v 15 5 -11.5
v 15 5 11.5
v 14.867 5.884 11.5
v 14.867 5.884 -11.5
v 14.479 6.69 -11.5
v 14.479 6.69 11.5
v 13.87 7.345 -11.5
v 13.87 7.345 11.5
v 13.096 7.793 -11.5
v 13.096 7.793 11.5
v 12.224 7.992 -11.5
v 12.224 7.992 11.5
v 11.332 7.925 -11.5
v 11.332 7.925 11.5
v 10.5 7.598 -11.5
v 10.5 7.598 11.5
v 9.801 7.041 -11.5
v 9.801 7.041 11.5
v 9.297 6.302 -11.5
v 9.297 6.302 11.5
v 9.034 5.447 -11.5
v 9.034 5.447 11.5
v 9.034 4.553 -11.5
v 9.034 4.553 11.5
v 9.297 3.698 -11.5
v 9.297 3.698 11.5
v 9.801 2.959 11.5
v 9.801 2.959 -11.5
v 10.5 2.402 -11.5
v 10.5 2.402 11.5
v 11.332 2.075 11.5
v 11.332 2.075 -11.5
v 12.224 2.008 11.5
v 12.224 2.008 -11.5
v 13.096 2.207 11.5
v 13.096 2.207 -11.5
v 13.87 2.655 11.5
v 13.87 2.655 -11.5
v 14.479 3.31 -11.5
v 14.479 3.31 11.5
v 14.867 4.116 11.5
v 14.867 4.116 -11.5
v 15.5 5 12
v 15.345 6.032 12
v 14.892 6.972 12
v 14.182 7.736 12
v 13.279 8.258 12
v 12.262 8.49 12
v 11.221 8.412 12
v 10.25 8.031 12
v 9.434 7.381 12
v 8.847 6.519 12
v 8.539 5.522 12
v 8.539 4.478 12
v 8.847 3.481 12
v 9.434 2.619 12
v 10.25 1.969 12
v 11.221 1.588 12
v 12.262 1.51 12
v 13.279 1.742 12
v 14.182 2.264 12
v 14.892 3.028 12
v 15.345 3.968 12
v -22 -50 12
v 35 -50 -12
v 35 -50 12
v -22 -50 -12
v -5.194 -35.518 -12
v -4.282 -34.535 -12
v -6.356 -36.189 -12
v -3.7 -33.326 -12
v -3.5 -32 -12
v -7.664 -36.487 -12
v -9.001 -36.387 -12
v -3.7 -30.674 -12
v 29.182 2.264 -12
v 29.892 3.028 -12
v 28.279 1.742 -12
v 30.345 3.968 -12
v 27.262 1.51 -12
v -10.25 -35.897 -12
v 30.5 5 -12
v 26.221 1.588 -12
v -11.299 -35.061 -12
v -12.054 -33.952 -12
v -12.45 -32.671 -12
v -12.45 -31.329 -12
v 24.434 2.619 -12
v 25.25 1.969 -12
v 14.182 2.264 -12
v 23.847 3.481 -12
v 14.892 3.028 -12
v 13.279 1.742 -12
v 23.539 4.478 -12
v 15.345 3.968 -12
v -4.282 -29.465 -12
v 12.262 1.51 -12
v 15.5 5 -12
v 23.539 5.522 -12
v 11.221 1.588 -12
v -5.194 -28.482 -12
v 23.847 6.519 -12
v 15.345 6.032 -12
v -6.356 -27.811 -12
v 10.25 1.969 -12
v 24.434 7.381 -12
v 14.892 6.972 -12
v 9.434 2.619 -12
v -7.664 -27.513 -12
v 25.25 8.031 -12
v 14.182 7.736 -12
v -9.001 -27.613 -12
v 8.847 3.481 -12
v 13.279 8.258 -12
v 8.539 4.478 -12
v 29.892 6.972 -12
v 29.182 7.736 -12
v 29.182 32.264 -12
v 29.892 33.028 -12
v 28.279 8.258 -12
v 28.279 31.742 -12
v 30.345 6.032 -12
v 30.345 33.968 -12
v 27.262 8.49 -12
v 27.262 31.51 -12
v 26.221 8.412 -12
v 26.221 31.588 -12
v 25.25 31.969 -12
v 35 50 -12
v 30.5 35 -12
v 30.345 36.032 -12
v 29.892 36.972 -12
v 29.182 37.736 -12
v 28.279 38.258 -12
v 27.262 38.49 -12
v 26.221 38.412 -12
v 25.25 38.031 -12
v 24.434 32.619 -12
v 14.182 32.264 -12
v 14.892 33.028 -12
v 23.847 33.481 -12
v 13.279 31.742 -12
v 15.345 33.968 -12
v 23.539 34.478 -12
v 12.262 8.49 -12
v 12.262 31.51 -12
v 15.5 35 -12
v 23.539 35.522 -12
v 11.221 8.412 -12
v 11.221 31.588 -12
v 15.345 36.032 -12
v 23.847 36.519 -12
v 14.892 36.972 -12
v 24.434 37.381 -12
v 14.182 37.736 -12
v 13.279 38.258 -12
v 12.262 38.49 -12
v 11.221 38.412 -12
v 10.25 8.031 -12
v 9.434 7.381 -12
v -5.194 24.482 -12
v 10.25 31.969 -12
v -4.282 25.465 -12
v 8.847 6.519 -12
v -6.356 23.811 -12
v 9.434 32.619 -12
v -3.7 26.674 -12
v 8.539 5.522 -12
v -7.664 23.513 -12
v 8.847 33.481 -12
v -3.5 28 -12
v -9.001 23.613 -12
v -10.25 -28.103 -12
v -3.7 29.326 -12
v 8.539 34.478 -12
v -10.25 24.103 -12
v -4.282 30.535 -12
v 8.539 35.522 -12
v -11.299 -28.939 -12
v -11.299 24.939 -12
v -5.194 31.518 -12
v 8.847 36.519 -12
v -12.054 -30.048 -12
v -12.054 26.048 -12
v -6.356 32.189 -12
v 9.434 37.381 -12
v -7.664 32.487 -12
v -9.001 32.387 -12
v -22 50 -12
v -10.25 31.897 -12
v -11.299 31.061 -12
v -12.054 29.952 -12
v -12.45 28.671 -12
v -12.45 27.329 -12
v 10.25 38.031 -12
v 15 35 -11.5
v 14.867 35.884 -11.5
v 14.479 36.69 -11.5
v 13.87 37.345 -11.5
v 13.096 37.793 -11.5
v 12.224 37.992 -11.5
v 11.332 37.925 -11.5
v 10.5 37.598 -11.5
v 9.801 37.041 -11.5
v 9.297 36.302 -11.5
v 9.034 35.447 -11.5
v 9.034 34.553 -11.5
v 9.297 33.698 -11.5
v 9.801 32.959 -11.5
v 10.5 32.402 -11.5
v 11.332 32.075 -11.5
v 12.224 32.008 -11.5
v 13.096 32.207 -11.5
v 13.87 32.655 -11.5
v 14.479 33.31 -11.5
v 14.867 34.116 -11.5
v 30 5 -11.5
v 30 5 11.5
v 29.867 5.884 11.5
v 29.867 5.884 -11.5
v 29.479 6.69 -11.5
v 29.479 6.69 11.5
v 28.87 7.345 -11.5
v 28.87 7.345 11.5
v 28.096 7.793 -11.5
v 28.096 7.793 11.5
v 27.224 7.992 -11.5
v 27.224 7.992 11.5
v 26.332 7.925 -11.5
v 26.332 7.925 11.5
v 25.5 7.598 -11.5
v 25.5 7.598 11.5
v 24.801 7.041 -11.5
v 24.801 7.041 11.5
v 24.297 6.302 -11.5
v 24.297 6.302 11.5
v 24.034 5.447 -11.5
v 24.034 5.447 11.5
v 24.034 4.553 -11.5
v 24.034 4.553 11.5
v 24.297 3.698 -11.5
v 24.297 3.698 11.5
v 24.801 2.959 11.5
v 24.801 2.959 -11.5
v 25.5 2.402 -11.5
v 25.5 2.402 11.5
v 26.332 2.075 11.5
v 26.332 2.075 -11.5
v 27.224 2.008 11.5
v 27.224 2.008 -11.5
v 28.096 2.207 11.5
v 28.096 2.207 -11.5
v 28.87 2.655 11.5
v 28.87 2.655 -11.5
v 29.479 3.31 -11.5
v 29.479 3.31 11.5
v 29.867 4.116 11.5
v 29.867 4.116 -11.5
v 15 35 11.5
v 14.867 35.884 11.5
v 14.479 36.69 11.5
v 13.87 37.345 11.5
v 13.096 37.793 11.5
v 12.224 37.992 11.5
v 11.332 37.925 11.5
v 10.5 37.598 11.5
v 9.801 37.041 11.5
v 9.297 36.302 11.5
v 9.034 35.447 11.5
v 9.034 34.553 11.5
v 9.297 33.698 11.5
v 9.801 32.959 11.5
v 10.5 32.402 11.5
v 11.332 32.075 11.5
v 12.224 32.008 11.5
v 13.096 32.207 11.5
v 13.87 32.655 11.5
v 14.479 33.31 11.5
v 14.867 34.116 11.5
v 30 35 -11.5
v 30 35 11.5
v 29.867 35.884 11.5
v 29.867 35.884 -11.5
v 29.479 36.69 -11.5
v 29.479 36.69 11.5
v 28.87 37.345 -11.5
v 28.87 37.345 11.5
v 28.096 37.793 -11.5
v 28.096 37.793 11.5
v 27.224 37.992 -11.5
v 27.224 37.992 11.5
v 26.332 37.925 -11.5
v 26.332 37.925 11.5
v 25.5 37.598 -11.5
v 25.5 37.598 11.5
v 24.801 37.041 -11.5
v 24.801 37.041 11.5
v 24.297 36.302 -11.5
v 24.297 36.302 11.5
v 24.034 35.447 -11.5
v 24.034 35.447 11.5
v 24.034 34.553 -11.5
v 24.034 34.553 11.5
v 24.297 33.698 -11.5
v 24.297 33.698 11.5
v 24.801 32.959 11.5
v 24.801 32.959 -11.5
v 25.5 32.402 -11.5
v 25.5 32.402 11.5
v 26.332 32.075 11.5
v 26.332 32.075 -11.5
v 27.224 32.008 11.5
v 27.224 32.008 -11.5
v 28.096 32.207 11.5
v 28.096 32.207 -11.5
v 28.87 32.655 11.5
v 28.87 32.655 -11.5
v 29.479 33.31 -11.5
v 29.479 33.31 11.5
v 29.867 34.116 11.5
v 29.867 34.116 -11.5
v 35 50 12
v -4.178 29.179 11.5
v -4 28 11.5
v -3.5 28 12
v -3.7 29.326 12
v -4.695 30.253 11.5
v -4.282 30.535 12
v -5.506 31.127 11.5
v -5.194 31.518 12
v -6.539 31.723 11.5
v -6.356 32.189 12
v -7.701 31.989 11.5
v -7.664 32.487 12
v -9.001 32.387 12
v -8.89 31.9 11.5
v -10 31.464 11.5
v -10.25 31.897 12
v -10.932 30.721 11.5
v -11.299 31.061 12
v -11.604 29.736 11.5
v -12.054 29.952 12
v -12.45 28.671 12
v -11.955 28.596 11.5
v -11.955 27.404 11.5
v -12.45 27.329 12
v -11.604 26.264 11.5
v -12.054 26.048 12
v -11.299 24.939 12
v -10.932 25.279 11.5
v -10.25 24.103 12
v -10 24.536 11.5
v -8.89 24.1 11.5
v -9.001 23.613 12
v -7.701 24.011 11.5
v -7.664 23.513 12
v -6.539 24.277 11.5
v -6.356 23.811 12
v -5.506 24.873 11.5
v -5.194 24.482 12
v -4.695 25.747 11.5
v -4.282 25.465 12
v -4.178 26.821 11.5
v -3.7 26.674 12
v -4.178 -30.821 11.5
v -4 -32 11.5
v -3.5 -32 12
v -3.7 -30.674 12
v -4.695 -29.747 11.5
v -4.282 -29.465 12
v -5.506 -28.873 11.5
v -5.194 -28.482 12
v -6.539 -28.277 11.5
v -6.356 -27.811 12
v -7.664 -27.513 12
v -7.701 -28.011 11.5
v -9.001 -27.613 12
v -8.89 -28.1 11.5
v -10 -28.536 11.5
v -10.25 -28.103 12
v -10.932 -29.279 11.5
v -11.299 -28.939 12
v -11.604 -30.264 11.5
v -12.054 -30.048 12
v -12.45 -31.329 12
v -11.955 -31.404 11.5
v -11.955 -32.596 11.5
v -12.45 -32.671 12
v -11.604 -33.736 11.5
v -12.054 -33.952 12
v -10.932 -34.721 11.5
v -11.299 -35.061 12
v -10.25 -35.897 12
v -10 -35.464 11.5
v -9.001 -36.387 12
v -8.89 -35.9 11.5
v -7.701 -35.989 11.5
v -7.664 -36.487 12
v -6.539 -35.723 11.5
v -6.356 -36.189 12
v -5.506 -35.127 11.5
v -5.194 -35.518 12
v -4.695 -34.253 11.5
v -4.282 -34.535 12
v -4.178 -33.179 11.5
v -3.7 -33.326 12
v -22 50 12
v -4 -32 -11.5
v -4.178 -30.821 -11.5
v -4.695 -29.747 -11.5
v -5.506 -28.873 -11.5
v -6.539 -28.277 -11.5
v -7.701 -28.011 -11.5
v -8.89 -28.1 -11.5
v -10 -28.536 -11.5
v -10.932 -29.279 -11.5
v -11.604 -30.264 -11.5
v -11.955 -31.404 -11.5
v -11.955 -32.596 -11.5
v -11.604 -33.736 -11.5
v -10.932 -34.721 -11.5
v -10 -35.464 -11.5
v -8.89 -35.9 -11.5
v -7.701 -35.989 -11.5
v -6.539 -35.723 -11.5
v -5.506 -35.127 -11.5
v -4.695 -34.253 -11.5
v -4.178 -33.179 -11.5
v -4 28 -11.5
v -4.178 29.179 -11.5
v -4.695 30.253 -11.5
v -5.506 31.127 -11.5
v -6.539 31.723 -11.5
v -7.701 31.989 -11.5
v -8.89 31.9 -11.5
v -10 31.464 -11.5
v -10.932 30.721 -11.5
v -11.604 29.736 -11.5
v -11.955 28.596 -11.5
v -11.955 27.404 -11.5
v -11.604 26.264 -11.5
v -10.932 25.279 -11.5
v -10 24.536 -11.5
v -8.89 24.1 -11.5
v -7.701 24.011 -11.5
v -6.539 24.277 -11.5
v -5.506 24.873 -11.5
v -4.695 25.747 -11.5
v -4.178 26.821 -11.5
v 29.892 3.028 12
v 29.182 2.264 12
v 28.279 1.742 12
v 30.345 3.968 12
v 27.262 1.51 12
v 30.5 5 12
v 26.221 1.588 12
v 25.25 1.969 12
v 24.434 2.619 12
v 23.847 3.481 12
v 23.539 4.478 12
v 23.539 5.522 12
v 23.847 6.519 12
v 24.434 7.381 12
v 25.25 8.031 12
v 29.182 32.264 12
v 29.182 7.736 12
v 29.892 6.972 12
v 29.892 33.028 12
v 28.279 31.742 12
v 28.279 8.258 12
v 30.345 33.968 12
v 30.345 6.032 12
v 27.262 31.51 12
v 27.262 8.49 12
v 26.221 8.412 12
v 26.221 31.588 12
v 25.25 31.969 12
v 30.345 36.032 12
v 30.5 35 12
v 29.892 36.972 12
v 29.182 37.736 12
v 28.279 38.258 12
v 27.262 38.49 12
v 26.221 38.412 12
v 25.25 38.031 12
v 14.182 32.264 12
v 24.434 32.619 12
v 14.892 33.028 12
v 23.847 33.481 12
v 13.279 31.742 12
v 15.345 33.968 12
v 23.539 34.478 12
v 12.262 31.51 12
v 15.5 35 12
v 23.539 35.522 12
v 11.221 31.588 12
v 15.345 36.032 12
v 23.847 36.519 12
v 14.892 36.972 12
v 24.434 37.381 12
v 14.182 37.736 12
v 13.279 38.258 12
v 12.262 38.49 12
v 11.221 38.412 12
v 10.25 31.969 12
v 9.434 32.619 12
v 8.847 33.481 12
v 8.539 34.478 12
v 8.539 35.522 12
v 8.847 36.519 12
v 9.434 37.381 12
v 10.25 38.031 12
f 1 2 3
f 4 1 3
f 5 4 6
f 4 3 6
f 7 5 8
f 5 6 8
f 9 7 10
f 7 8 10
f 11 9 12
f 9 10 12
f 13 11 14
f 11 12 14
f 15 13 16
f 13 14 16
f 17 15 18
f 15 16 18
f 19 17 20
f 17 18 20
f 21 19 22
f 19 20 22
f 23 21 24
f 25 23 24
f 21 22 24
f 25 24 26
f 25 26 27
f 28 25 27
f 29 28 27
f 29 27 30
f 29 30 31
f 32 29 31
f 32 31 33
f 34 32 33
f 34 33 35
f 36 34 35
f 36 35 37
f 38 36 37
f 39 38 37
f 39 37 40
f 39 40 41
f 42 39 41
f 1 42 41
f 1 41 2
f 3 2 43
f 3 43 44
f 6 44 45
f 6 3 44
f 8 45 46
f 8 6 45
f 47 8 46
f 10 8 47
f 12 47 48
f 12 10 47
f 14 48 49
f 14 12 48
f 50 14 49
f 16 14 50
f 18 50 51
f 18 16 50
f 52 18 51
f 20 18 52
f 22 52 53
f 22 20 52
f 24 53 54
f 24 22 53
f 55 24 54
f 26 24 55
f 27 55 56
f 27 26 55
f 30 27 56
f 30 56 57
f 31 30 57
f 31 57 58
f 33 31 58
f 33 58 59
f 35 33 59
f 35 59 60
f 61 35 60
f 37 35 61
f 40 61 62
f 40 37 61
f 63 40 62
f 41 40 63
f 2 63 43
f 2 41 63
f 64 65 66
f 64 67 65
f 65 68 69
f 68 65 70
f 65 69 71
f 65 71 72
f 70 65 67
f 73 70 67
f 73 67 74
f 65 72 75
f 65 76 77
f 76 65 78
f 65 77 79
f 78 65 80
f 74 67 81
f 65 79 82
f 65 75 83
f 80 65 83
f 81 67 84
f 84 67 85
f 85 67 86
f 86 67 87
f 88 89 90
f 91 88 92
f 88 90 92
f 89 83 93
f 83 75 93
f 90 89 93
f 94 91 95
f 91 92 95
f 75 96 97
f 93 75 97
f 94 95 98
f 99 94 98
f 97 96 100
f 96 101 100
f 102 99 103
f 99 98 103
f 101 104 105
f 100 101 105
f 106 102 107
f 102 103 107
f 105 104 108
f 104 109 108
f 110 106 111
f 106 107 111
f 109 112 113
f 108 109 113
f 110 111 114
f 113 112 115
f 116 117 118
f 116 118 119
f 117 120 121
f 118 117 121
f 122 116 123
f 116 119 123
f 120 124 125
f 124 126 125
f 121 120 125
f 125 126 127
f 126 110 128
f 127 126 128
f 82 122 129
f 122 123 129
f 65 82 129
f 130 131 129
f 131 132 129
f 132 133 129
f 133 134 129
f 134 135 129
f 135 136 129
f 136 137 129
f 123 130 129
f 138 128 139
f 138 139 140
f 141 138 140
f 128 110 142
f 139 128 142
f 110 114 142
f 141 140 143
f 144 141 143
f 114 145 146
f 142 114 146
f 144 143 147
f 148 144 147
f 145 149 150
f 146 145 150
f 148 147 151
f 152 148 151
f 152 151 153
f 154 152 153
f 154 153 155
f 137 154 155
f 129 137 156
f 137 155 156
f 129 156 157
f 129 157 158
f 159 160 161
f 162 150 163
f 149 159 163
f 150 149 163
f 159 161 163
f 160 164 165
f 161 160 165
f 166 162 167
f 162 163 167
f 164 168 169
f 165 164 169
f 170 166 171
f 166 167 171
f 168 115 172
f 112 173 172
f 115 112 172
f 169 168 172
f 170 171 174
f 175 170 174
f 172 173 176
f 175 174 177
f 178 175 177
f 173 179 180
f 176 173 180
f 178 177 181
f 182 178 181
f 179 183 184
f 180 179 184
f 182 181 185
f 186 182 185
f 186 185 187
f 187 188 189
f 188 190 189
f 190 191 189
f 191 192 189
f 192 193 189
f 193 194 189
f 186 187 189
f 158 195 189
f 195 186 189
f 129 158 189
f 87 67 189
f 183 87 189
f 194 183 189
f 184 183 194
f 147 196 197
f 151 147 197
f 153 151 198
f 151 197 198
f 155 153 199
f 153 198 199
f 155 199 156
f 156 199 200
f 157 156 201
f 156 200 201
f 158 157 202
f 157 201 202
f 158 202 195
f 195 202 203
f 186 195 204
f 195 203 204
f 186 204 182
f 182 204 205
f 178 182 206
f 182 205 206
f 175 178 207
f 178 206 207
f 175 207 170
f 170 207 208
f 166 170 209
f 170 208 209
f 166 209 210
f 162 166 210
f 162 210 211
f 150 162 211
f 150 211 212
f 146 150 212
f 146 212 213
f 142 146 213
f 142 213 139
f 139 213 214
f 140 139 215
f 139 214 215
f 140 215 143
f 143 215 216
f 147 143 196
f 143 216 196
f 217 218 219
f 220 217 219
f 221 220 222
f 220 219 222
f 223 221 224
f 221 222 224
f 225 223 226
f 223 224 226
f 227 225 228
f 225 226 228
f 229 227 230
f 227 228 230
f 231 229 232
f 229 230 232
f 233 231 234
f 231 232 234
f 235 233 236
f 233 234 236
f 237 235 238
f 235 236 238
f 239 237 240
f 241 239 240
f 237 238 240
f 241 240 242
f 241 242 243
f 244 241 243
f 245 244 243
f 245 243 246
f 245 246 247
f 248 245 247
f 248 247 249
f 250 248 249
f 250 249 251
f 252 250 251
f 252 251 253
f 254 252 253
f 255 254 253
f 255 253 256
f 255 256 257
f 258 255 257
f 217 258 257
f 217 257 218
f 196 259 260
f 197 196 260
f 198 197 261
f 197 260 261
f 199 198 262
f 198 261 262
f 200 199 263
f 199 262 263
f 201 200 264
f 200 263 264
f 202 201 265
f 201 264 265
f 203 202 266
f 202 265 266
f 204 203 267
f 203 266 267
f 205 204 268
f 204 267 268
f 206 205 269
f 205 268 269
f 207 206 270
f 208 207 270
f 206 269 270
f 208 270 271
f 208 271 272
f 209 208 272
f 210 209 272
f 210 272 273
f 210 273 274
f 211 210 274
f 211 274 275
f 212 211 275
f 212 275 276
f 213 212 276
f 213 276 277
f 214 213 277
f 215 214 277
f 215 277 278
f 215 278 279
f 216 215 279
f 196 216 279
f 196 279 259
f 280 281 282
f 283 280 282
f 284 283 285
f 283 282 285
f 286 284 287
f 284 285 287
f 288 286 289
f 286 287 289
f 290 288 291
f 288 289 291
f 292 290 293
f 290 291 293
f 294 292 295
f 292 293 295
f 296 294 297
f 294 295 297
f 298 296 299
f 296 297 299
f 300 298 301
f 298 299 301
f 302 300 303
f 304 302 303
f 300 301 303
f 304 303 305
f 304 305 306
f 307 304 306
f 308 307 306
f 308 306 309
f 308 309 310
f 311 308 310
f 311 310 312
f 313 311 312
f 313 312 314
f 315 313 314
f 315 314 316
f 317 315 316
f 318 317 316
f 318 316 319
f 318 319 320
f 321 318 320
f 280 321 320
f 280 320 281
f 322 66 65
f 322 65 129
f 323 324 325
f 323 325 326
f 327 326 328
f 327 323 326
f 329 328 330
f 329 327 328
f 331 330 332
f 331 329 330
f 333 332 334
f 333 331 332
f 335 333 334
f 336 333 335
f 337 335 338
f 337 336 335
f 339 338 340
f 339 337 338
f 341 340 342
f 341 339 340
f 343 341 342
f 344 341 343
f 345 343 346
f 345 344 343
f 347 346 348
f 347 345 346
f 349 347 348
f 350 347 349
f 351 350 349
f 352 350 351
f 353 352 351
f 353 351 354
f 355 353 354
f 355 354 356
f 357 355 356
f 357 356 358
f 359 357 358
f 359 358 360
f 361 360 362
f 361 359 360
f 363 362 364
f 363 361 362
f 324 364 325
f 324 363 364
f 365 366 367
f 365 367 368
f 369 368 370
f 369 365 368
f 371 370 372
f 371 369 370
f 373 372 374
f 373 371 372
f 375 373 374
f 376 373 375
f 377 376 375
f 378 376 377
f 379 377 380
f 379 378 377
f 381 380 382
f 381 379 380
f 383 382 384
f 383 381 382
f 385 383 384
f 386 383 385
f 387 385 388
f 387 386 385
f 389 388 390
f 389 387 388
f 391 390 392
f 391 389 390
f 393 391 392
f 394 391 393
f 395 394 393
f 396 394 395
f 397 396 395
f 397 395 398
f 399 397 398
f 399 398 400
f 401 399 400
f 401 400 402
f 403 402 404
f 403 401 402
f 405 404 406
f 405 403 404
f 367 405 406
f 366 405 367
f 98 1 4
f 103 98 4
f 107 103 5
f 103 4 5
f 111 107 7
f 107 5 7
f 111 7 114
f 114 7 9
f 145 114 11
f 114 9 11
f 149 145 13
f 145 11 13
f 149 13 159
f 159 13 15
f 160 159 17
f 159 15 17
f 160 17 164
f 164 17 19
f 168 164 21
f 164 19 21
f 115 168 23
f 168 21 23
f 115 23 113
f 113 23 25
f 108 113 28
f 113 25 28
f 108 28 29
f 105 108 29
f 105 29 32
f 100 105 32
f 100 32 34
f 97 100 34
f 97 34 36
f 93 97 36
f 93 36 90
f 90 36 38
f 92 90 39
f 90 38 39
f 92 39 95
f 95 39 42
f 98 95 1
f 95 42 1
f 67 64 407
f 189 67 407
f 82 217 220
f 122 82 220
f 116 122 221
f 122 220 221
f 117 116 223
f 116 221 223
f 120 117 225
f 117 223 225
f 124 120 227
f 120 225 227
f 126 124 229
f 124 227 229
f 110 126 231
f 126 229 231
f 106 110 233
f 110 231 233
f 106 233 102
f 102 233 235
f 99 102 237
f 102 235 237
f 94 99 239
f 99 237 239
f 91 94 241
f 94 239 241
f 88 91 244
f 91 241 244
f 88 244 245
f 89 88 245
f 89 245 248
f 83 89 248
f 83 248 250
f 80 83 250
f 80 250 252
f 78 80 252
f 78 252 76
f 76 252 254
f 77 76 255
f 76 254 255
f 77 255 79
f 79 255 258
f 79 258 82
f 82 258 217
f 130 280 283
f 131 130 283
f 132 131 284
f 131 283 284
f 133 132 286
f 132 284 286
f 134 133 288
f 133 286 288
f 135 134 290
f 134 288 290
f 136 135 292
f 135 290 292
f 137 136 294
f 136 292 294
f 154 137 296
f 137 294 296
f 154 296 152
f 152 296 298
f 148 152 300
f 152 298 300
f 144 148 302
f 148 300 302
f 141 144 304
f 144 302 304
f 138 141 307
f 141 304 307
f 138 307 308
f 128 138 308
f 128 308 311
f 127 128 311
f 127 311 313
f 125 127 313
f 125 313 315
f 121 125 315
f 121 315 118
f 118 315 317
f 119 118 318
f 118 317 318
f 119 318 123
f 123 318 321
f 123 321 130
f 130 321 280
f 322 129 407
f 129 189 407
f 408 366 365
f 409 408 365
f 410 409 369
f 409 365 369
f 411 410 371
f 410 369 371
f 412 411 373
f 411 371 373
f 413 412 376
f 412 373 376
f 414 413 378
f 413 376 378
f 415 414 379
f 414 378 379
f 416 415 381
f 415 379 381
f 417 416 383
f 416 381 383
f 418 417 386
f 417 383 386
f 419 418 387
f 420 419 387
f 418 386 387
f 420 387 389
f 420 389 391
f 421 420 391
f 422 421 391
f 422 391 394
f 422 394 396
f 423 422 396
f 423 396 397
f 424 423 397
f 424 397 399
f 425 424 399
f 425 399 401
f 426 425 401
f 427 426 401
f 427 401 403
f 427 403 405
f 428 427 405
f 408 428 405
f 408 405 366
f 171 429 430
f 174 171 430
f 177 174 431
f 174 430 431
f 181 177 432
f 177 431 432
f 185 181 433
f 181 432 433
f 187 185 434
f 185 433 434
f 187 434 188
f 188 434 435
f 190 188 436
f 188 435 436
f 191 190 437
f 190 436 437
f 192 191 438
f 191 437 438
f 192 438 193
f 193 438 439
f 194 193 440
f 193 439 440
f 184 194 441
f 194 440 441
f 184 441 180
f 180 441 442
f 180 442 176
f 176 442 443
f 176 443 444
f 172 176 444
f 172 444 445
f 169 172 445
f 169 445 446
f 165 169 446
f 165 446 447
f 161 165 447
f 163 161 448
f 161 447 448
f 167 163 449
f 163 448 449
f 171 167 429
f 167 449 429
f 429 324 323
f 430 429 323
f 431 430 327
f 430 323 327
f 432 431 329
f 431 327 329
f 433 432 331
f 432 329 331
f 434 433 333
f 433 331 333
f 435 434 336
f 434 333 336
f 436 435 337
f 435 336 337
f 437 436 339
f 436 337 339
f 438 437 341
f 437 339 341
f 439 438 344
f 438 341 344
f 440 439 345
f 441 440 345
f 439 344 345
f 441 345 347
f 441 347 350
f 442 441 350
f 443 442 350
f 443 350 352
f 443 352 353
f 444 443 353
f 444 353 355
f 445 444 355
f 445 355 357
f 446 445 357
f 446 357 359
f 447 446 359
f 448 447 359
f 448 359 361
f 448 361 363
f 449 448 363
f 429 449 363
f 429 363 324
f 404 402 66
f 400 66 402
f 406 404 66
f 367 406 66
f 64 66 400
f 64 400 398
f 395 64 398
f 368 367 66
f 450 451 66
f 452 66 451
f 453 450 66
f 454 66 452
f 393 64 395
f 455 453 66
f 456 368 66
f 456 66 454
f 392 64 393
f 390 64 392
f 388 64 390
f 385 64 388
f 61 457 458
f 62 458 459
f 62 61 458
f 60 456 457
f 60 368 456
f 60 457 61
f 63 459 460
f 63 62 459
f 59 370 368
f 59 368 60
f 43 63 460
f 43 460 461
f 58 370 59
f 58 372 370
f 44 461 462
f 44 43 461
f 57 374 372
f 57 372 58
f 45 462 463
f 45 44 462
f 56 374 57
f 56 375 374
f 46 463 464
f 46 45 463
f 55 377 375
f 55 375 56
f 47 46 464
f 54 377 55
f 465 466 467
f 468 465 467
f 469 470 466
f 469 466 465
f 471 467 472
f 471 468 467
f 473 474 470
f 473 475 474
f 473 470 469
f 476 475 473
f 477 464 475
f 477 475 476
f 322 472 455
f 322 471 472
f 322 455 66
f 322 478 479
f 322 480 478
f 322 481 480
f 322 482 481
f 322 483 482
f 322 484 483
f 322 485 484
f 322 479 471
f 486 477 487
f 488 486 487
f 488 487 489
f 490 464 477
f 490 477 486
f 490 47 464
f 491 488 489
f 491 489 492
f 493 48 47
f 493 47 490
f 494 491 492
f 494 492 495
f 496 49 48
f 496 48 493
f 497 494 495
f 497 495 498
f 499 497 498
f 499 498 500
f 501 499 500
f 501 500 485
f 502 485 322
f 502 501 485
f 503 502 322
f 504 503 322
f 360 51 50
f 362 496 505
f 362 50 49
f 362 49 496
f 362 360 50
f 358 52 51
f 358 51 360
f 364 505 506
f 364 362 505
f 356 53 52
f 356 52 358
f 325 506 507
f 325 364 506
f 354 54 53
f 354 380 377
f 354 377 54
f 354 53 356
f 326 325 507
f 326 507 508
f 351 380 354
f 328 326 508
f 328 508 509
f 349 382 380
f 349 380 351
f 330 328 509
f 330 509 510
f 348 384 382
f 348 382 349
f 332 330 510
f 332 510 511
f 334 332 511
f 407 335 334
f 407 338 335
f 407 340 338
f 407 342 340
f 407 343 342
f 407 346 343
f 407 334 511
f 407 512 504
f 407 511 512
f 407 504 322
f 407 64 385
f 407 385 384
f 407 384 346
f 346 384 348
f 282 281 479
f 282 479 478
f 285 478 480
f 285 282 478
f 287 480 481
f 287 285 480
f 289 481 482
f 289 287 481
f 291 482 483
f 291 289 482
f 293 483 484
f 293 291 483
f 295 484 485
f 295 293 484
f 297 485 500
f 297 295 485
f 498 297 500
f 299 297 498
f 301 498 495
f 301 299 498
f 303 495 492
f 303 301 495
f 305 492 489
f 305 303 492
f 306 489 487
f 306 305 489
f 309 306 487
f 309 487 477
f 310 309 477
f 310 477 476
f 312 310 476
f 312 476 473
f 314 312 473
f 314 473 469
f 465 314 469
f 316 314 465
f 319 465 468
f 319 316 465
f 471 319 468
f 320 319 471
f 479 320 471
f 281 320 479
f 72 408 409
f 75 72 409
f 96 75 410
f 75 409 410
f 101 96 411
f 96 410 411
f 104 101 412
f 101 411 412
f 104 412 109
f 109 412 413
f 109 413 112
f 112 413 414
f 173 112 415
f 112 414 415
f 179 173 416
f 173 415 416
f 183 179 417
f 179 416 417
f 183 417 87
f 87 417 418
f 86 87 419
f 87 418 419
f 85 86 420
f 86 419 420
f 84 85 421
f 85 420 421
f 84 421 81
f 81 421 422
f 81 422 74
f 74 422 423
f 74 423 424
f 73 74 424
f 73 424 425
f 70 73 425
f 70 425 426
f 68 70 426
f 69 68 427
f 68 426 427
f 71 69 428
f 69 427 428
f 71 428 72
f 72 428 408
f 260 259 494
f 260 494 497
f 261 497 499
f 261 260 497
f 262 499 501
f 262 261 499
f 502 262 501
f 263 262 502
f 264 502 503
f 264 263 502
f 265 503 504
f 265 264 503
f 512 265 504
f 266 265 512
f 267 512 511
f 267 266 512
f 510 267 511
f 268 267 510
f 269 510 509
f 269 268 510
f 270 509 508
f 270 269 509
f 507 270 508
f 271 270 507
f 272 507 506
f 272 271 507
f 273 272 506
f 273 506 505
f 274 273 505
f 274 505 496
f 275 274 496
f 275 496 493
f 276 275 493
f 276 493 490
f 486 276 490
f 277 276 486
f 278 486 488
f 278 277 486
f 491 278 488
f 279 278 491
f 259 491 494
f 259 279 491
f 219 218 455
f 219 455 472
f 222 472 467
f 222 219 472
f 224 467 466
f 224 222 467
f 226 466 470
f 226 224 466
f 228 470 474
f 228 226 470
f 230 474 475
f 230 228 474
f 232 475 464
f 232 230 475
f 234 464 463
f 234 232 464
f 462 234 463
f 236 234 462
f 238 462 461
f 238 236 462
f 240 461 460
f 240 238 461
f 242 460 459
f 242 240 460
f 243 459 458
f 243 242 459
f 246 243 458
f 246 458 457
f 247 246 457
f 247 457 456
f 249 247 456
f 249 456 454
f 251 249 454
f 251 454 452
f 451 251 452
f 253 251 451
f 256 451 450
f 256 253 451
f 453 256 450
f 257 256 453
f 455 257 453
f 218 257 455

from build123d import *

# Parameters (mm, degrees)
F0_W     = 100
F0_H     = 24
F1_DEPTH = 22
F2_R     = 4
F3_DEPTH = 24.001
F4_SIZE  = 0.5
F5_W     = 100
F5_H     = 24
F6_DEPTH = 35
F7_R     = 3
F8_DEPTH = 24.001
F9_SIZE  = 0.5


with BuildPart() as f1:
    # F0 (on Right) → F1 (new body)
    with BuildSketch(Plane.YZ):
        Rectangle(F0_W, F0_H)
    extrude(amount=-F1_DEPTH)

    # F2 (on face) → F3 (cut, through all)
    with BuildSketch(Plane.XY.offset(12)):
        with Locations((-8, 28)):
            Circle(F2_R)
        with Locations((-8, -32)):
            Circle(F2_R)
    extrude(amount=-F3_DEPTH, mode=Mode.SUBTRACT)

    # F4
    f4_edges = [f1.edges().sort_by_distance(p)[0] for p in [
        (-12, 28, 12),
        (-4, 28, 0),
        (-12, 28, -12),
        (-12, -32, 12),
        (-4, -32, 0),
        (-12, -32, -12),
    ]]
    chamfer(f4_edges, length=F4_SIZE)

    # F5 (on face) → F6 (join)
    with BuildSketch(Plane.YZ):
        Rectangle(F5_W, F5_H)
    extrude(amount=F6_DEPTH)

    # F7 (on face) → F8 (cut, through all)
    with BuildSketch(Plane.XY.offset(12)):
        with Locations((27, 5)):
            Circle(F7_R)
        with Locations((27, 35)):
            Circle(F7_R)
        with Locations((12, 35)):
            Circle(F7_R)
        with Locations((12, 5)):
            Circle(F7_R)
    extrude(amount=-F8_DEPTH, mode=Mode.SUBTRACT)

    # F9
    f9_edges = [f1.edges().sort_by_distance(p)[0] for p in [
        (24, 5, 12),
        (30, 5, 0),
        (24, 5, -12),
        (24, 35, 12),
        (30, 35, 0),
        (24, 35, -12),
        (9, 35, 12),
        (15, 35, 0),
        (9, 35, -12),
        (9, 5, 12),
        (15, 5, 0),
        (9, 5, -12),
    ]]
    chamfer(f9_edges, length=F9_SIZE)


solid = f1.part
